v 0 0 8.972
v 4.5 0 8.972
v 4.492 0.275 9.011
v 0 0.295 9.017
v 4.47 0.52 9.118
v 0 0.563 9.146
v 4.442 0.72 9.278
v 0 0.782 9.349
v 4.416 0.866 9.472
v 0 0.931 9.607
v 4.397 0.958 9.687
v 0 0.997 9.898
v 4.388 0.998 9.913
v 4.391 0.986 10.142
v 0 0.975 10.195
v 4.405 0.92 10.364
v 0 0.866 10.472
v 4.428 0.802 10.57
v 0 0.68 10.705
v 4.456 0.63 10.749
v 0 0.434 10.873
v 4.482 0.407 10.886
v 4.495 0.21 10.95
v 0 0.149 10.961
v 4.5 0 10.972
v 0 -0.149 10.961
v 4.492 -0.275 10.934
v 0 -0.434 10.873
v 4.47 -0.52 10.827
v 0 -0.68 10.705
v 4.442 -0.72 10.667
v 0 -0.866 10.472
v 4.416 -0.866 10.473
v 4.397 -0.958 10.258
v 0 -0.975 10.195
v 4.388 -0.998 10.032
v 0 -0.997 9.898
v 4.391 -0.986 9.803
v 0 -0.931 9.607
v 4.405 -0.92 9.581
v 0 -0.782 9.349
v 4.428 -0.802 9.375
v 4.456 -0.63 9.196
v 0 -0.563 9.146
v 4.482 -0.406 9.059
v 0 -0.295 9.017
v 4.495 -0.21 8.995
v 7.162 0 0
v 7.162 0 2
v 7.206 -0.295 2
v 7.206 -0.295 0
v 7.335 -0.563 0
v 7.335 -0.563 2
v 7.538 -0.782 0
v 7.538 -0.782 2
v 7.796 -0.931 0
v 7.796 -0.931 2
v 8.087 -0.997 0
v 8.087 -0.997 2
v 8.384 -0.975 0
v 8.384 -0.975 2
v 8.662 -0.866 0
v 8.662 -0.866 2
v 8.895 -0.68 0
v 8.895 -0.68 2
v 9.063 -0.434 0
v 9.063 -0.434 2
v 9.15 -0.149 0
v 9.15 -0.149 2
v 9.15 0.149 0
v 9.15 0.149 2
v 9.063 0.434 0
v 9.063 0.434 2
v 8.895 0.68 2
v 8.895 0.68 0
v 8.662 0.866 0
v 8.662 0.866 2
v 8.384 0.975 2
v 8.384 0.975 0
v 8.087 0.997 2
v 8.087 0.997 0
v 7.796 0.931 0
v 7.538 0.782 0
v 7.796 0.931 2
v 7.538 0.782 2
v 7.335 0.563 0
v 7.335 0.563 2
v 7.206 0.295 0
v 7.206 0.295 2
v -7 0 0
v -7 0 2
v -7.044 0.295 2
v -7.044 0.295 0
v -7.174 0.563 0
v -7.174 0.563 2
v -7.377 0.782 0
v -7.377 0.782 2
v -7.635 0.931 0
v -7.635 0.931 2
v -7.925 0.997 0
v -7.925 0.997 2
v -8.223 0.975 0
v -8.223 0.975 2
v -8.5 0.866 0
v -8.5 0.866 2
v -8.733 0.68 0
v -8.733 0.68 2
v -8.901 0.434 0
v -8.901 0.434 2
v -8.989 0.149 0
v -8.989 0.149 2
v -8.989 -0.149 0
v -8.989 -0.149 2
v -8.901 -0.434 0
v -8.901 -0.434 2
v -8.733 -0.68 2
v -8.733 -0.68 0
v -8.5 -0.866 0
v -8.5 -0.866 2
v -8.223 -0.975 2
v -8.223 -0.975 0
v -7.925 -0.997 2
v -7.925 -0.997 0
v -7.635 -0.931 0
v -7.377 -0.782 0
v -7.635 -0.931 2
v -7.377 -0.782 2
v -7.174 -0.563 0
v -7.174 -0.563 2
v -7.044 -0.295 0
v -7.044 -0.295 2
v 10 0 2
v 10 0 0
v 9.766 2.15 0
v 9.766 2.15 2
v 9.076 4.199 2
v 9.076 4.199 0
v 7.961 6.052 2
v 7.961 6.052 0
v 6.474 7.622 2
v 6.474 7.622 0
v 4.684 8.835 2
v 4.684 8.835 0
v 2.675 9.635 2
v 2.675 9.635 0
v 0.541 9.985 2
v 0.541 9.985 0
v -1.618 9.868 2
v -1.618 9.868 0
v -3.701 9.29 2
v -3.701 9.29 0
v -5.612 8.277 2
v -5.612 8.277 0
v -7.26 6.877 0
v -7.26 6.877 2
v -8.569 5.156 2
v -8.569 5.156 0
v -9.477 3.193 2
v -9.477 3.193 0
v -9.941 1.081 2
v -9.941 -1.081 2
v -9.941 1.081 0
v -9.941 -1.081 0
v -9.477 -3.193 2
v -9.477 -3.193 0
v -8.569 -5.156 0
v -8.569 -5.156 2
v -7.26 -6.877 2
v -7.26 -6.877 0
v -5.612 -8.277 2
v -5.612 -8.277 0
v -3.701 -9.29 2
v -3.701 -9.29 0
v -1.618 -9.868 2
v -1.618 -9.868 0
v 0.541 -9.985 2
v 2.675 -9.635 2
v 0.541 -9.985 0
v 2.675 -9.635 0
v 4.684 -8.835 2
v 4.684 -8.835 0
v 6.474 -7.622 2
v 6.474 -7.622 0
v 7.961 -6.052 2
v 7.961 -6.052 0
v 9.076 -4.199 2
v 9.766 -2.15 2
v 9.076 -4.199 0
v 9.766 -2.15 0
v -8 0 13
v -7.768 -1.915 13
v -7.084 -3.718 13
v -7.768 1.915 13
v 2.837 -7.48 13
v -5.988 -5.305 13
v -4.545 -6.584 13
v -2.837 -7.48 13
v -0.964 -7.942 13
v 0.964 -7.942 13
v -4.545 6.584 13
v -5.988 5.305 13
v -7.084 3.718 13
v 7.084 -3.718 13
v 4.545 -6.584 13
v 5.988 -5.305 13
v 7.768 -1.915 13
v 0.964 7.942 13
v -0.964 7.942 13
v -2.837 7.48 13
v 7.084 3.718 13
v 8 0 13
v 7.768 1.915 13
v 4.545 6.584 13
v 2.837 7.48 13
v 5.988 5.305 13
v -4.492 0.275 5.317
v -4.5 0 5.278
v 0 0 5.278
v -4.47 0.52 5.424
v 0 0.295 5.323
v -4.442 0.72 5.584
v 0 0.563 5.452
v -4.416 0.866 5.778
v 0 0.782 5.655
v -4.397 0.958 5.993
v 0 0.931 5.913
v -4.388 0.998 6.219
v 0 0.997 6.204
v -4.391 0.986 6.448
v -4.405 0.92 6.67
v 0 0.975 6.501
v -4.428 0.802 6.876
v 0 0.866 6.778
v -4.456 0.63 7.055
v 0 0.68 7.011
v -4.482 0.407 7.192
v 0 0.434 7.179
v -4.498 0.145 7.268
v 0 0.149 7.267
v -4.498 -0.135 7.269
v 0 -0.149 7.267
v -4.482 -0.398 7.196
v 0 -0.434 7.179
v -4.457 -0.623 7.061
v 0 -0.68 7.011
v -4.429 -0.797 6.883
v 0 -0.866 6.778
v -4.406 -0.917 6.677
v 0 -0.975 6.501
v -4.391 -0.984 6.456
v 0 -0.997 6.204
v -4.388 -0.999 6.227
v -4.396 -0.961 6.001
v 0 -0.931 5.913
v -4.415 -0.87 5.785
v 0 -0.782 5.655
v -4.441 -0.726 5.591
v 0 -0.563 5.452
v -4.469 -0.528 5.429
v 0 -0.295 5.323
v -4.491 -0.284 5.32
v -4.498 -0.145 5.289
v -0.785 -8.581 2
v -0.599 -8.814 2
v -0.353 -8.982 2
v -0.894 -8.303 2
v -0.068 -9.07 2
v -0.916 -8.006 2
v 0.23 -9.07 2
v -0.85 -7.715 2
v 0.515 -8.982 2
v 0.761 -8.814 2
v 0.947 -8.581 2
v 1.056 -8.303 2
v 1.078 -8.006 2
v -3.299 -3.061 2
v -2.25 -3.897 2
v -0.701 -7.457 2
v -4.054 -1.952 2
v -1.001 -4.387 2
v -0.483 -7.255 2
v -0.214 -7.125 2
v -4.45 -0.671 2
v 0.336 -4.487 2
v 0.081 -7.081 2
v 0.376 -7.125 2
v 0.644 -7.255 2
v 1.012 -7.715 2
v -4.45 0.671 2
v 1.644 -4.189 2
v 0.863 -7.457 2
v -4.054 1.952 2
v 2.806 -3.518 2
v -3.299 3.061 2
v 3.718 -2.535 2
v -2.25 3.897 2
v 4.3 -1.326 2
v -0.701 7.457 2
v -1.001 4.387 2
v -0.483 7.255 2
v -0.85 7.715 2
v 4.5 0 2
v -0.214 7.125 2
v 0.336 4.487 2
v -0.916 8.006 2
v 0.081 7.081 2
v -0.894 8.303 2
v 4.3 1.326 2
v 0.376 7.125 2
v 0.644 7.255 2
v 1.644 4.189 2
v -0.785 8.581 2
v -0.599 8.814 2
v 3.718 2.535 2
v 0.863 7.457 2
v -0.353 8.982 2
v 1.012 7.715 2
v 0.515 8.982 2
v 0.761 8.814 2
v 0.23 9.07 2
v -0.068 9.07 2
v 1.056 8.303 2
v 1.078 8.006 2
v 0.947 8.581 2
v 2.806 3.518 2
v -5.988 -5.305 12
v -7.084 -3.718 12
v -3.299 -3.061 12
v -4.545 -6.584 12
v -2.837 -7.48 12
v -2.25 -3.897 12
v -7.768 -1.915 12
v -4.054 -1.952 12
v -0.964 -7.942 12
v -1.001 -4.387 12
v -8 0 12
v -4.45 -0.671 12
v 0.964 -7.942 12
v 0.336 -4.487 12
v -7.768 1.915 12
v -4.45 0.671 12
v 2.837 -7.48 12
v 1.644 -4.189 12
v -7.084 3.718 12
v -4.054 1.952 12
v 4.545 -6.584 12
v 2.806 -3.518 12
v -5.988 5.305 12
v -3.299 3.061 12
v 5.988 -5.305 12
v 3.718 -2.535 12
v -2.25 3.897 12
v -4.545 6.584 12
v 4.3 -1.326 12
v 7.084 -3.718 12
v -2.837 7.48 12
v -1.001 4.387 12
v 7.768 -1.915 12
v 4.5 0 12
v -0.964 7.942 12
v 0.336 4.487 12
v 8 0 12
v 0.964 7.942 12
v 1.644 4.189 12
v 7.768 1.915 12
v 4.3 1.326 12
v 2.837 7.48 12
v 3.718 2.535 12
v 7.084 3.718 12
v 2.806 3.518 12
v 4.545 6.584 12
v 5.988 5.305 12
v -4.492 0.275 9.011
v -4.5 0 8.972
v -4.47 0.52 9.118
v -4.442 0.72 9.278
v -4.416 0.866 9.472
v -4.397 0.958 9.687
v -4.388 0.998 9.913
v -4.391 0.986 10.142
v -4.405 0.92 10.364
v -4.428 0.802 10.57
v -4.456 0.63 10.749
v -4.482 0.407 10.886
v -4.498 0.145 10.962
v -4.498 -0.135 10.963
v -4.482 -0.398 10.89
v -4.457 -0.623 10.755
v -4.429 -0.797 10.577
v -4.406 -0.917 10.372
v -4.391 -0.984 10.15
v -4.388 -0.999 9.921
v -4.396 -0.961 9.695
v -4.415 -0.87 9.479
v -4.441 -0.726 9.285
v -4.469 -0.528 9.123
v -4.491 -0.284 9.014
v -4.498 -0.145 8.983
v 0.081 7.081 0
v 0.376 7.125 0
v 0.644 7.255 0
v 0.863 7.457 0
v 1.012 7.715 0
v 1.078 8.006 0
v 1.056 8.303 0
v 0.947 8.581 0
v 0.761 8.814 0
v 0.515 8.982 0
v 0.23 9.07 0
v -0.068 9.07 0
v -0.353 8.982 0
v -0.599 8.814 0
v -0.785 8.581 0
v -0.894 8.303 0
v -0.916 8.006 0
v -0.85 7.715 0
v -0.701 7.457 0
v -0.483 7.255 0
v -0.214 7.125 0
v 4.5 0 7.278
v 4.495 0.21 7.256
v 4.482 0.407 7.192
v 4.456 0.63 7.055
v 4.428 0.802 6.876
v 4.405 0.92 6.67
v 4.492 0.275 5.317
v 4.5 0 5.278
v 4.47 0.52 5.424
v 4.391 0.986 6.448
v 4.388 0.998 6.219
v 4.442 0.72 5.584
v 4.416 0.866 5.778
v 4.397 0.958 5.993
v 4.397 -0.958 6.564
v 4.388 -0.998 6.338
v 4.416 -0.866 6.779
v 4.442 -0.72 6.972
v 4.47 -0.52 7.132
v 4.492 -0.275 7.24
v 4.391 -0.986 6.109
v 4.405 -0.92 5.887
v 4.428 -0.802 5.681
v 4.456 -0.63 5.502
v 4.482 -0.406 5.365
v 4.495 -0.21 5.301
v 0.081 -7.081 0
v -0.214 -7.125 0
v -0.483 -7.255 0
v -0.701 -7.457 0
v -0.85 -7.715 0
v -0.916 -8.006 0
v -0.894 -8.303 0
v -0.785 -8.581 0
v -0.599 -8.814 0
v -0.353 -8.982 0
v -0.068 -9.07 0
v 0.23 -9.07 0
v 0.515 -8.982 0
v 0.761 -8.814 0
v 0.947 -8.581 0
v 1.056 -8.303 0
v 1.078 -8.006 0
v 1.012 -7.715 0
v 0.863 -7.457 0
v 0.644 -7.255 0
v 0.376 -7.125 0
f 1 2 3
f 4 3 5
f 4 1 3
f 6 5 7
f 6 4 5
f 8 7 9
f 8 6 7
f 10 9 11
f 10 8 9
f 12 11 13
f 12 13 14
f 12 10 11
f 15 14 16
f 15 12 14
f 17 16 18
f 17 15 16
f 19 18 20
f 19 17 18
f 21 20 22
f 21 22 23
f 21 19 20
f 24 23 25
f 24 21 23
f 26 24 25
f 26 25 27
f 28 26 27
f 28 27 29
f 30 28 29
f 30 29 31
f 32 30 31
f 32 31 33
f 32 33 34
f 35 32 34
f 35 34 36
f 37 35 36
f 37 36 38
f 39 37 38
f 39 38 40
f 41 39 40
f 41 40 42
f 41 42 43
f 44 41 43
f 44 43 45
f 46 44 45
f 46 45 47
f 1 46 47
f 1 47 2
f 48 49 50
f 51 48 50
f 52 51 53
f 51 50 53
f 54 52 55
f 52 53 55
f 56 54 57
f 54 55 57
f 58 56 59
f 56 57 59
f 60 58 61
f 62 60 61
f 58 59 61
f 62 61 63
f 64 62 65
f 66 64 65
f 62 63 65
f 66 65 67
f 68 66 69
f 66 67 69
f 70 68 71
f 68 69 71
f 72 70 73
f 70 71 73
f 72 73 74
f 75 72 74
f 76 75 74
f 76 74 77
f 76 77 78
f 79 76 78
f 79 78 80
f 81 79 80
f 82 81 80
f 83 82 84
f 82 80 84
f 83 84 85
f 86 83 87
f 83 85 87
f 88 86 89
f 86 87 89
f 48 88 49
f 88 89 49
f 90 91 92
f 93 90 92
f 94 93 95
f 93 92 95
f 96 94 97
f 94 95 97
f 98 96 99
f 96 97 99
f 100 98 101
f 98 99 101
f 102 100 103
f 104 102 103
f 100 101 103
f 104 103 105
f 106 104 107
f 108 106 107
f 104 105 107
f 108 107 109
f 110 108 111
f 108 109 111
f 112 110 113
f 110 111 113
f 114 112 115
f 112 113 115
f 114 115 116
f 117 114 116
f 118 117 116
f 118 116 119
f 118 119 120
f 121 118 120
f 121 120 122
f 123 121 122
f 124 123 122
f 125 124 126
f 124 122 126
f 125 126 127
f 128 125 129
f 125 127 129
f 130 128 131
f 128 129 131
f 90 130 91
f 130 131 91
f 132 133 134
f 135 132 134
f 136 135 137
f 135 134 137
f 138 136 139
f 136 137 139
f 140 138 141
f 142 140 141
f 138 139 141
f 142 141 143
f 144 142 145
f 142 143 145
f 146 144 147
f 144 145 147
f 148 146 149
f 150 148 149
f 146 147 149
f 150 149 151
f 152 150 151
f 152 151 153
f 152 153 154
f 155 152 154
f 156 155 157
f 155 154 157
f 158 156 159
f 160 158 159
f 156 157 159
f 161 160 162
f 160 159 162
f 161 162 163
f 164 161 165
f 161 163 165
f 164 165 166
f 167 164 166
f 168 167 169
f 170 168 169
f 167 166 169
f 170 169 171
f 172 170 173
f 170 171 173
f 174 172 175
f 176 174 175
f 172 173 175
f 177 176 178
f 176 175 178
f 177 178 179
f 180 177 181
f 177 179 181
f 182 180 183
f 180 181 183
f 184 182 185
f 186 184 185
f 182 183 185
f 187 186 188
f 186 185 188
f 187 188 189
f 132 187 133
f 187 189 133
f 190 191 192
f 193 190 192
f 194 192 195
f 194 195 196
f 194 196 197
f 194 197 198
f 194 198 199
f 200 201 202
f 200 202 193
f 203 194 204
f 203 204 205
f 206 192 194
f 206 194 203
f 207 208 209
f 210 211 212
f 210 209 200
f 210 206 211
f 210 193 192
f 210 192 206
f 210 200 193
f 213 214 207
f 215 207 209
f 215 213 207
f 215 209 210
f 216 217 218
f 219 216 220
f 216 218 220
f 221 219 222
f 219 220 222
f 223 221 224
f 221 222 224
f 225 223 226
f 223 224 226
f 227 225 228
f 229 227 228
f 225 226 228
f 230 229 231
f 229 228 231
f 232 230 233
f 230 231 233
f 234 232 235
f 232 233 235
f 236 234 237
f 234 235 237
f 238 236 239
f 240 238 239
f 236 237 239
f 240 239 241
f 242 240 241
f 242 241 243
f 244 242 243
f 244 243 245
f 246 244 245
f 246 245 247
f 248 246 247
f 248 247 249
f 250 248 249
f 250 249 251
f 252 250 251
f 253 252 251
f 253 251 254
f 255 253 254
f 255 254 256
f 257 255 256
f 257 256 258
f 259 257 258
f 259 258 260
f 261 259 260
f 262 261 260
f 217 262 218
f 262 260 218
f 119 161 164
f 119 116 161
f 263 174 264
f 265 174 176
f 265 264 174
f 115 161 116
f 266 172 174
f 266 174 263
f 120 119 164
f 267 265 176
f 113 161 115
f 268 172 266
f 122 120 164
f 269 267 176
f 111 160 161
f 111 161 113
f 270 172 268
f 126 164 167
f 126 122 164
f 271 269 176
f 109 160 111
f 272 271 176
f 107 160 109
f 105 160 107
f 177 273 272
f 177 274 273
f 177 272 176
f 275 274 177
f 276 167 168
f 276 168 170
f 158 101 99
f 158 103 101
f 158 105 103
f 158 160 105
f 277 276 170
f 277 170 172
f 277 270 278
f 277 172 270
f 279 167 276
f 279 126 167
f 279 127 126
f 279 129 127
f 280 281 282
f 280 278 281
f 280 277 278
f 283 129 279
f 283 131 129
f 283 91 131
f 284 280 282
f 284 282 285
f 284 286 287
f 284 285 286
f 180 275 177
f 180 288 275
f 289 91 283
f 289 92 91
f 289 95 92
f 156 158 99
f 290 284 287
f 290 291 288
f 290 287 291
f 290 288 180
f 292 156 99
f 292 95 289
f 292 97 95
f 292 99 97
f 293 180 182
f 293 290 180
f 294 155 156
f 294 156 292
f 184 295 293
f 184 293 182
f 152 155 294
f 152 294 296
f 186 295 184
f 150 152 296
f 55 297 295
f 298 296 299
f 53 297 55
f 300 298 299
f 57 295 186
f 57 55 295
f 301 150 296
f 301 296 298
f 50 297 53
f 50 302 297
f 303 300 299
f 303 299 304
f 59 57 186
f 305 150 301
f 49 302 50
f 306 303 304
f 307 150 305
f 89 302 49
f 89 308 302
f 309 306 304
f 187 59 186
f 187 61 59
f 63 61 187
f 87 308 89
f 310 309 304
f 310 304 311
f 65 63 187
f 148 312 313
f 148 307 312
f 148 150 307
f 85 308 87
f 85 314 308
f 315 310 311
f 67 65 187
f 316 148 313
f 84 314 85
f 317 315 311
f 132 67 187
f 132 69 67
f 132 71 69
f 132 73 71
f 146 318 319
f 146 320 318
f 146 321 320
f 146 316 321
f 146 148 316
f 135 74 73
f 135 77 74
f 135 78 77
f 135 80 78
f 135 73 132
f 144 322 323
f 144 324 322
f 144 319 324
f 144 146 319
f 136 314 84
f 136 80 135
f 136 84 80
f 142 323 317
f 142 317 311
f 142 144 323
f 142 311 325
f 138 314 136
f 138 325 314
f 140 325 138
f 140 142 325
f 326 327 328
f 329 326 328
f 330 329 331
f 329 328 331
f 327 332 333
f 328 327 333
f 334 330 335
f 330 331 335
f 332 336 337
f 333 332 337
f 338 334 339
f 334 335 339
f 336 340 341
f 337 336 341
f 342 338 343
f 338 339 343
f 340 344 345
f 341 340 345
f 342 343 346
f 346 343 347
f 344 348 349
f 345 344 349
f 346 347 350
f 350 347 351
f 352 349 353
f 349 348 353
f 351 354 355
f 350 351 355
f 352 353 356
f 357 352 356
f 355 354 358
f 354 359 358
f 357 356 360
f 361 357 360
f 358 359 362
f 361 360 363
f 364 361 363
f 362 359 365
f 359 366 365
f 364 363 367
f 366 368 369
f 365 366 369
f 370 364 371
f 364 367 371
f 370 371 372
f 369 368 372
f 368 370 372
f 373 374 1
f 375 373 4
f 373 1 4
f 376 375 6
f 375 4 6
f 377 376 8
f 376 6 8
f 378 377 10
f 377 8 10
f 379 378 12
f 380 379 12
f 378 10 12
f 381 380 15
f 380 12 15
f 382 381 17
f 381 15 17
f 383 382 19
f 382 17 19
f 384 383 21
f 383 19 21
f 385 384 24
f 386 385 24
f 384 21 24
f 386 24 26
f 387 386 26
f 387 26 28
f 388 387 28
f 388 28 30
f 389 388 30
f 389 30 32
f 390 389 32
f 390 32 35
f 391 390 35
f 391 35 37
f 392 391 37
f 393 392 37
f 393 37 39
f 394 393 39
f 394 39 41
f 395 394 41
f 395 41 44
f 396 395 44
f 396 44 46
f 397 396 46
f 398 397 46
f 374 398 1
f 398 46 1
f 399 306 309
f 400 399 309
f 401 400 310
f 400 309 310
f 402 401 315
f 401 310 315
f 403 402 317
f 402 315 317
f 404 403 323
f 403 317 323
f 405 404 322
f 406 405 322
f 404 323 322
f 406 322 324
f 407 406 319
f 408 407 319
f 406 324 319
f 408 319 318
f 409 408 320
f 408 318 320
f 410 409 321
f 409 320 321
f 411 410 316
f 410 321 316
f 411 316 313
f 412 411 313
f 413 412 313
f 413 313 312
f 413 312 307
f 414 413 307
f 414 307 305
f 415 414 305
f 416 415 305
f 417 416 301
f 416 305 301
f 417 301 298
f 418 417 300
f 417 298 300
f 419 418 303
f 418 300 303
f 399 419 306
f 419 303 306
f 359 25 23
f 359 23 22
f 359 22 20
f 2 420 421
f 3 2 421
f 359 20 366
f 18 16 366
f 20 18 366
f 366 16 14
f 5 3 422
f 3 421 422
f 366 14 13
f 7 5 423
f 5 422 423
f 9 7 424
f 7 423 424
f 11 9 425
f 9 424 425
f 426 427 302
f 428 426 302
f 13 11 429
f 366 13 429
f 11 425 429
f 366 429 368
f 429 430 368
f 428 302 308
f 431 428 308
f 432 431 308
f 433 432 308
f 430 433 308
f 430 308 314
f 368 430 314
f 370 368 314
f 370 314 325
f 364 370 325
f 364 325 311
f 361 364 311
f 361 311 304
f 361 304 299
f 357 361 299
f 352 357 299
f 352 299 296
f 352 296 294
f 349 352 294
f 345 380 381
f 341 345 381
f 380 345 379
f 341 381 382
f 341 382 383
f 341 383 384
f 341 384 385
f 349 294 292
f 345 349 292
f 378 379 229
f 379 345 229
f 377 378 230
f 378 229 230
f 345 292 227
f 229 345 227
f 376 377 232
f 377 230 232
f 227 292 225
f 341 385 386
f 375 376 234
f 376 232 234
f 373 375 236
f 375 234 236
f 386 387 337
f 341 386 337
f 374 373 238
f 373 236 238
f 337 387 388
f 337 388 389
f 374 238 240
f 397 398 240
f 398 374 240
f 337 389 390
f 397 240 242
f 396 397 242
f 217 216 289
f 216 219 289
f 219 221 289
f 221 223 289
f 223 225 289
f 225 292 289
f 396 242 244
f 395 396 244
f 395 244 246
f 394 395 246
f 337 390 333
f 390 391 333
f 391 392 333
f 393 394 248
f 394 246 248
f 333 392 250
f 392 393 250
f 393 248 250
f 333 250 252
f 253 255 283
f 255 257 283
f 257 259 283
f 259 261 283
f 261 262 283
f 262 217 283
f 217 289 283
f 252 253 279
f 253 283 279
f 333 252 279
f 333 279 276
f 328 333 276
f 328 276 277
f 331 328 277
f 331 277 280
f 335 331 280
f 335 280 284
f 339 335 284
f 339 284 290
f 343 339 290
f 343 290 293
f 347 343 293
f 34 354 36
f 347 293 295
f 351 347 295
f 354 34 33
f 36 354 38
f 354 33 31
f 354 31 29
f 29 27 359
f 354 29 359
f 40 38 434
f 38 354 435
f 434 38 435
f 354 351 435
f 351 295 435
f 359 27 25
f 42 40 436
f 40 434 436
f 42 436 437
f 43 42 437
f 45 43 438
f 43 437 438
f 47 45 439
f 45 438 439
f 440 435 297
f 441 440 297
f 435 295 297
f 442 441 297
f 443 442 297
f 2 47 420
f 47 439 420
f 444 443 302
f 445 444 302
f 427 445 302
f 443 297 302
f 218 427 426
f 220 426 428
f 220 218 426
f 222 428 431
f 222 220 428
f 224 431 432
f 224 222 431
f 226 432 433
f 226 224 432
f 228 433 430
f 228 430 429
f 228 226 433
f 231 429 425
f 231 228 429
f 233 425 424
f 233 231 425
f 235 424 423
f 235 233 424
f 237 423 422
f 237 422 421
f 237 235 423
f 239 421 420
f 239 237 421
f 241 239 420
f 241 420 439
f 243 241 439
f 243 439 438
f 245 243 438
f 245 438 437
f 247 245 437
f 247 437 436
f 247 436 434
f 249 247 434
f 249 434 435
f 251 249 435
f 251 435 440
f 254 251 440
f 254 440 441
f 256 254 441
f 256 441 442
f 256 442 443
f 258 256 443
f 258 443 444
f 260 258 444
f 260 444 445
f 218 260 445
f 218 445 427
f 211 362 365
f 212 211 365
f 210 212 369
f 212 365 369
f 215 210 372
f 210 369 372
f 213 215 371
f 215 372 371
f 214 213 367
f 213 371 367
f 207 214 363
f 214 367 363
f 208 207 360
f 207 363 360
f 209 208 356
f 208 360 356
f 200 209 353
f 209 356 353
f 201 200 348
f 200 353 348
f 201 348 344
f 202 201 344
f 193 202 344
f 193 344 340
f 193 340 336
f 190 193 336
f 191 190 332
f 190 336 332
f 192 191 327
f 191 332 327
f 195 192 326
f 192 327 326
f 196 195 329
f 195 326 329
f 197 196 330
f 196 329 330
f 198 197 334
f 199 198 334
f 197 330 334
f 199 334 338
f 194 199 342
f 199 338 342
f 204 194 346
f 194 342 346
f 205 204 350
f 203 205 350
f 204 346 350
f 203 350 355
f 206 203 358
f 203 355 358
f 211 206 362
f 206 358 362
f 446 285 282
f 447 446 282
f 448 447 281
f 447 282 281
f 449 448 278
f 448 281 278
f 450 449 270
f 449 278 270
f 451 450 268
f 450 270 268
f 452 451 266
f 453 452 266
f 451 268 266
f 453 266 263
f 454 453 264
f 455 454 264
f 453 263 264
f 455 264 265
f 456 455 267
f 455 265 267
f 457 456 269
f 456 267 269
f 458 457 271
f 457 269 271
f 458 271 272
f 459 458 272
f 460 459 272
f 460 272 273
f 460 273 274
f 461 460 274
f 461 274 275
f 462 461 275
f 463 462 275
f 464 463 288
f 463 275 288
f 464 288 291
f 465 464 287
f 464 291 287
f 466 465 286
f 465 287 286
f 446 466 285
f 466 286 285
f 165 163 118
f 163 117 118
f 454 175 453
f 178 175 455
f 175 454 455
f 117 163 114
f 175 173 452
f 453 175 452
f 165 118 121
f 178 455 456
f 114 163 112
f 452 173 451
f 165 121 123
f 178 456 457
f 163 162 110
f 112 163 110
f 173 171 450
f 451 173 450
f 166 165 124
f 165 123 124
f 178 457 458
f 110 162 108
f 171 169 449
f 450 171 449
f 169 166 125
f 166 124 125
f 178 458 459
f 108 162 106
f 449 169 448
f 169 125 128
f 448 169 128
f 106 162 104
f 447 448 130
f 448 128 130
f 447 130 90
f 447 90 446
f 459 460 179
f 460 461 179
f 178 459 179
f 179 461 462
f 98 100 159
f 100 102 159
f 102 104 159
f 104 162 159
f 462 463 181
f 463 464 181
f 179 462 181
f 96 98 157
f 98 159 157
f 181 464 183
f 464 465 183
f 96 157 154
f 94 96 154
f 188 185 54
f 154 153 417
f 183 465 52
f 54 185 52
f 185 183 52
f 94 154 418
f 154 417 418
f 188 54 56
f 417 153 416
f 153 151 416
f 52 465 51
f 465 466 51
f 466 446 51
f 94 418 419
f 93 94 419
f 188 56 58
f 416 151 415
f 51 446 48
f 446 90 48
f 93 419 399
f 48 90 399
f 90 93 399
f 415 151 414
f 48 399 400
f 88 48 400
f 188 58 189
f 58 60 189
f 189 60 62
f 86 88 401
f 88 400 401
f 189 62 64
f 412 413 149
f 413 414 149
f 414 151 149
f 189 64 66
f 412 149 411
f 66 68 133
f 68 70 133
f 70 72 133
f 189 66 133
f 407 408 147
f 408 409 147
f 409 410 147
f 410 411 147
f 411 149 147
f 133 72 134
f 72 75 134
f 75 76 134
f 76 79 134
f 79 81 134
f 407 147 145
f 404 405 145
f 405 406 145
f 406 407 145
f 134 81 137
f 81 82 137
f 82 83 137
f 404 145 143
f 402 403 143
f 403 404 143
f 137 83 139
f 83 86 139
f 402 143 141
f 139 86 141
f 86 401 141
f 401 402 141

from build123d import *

# Parameters (mm, degrees)
SKIZZE1_R                            = 10
AUFSATZ_LINEAR_AUSTRAGEN1_DEPTH      = 2
SKIZZE4_R                            = 1
SCHNITT_LINEAR_AUSTRAGEN1_DEPTH      = 2
KREISMUSTER1_COUNT                   = 4
SKIZZE5_R                            = 4.5
AUFSATZ_LINEAR_AUSTRAGEN2_DEPTH      = 10
SKIZZE6_R                            = 8
AUFSATZ_LINEAR_AUSTRAGEN3_DEPTH      = 1
SKIZZE7_R                            = 1
SCHNITT_LINEAR_AUSTRAGEN2_DEPTH      = 5
SCHNITT_LINEAR_AUSTRAGEN2_DEPTH_BACK = 5


with BuildPart() as part:
    # Skizze1 → Aufsatz-Linear austragen1 (new body)
    with BuildSketch(Plane.XY):
        Circle(SKIZZE1_R)
    extrude(amount=AUFSATZ_LINEAR_AUSTRAGEN1_DEPTH)

    # Skizze4 → Schnitt-Linear austragen1 (cut)
    with BuildSketch(Plane.XY.offset(2)):
        with Locations((-8, 0)):
            Circle(SKIZZE4_R)
    schnitt_linear_austragen1 = extrude(amount=-SCHNITT_LINEAR_AUSTRAGEN1_DEPTH, mode=Mode.SUBTRACT)

    # Kreismuster1: Schnitt-Linear austragen1 ×4 about axis
    kreismuster1_axis = Axis((0.080808081, 0, 0), (0, 0, 1))
    for i in range(1, KREISMUSTER1_COUNT):
        add(schnitt_linear_austragen1.rotate(kreismuster1_axis, i * 360 / KREISMUSTER1_COUNT), mode=Mode.SUBTRACT)

    # Skizze5 → Aufsatz-Linear austragen2 (add)
    with BuildSketch(Plane.XY.offset(2)):
        Circle(SKIZZE5_R)
    extrude(amount=AUFSATZ_LINEAR_AUSTRAGEN2_DEPTH)

    # Skizze6 → Aufsatz-Linear austragen3 (add)
    with BuildSketch(Plane.XY.offset(12)):
        Circle(SKIZZE6_R)
    extrude(amount=AUFSATZ_LINEAR_AUSTRAGEN3_DEPTH)

    # Skizze7 → Schnitt-Linear austragen2 (cut, two sides)
    with BuildSketch(Plane(origin=(0, 0, 0), x_dir=(0, 0, -1), z_dir=(1, 0, 0))) as schnitt_linear_austragen2_sk:
        with Locations((-9.972447251, 0)):
            Circle(SKIZZE7_R)
        with Locations((-6.278379976, 0)):
            Circle(SKIZZE7_R)
    extrude(amount=SCHNITT_LINEAR_AUSTRAGEN2_DEPTH, mode=Mode.SUBTRACT)
    extrude(schnitt_linear_austragen2_sk.sketch, amount=-SCHNITT_LINEAR_AUSTRAGEN2_DEPTH_BACK, mode=Mode.SUBTRACT)


solid = part.part
